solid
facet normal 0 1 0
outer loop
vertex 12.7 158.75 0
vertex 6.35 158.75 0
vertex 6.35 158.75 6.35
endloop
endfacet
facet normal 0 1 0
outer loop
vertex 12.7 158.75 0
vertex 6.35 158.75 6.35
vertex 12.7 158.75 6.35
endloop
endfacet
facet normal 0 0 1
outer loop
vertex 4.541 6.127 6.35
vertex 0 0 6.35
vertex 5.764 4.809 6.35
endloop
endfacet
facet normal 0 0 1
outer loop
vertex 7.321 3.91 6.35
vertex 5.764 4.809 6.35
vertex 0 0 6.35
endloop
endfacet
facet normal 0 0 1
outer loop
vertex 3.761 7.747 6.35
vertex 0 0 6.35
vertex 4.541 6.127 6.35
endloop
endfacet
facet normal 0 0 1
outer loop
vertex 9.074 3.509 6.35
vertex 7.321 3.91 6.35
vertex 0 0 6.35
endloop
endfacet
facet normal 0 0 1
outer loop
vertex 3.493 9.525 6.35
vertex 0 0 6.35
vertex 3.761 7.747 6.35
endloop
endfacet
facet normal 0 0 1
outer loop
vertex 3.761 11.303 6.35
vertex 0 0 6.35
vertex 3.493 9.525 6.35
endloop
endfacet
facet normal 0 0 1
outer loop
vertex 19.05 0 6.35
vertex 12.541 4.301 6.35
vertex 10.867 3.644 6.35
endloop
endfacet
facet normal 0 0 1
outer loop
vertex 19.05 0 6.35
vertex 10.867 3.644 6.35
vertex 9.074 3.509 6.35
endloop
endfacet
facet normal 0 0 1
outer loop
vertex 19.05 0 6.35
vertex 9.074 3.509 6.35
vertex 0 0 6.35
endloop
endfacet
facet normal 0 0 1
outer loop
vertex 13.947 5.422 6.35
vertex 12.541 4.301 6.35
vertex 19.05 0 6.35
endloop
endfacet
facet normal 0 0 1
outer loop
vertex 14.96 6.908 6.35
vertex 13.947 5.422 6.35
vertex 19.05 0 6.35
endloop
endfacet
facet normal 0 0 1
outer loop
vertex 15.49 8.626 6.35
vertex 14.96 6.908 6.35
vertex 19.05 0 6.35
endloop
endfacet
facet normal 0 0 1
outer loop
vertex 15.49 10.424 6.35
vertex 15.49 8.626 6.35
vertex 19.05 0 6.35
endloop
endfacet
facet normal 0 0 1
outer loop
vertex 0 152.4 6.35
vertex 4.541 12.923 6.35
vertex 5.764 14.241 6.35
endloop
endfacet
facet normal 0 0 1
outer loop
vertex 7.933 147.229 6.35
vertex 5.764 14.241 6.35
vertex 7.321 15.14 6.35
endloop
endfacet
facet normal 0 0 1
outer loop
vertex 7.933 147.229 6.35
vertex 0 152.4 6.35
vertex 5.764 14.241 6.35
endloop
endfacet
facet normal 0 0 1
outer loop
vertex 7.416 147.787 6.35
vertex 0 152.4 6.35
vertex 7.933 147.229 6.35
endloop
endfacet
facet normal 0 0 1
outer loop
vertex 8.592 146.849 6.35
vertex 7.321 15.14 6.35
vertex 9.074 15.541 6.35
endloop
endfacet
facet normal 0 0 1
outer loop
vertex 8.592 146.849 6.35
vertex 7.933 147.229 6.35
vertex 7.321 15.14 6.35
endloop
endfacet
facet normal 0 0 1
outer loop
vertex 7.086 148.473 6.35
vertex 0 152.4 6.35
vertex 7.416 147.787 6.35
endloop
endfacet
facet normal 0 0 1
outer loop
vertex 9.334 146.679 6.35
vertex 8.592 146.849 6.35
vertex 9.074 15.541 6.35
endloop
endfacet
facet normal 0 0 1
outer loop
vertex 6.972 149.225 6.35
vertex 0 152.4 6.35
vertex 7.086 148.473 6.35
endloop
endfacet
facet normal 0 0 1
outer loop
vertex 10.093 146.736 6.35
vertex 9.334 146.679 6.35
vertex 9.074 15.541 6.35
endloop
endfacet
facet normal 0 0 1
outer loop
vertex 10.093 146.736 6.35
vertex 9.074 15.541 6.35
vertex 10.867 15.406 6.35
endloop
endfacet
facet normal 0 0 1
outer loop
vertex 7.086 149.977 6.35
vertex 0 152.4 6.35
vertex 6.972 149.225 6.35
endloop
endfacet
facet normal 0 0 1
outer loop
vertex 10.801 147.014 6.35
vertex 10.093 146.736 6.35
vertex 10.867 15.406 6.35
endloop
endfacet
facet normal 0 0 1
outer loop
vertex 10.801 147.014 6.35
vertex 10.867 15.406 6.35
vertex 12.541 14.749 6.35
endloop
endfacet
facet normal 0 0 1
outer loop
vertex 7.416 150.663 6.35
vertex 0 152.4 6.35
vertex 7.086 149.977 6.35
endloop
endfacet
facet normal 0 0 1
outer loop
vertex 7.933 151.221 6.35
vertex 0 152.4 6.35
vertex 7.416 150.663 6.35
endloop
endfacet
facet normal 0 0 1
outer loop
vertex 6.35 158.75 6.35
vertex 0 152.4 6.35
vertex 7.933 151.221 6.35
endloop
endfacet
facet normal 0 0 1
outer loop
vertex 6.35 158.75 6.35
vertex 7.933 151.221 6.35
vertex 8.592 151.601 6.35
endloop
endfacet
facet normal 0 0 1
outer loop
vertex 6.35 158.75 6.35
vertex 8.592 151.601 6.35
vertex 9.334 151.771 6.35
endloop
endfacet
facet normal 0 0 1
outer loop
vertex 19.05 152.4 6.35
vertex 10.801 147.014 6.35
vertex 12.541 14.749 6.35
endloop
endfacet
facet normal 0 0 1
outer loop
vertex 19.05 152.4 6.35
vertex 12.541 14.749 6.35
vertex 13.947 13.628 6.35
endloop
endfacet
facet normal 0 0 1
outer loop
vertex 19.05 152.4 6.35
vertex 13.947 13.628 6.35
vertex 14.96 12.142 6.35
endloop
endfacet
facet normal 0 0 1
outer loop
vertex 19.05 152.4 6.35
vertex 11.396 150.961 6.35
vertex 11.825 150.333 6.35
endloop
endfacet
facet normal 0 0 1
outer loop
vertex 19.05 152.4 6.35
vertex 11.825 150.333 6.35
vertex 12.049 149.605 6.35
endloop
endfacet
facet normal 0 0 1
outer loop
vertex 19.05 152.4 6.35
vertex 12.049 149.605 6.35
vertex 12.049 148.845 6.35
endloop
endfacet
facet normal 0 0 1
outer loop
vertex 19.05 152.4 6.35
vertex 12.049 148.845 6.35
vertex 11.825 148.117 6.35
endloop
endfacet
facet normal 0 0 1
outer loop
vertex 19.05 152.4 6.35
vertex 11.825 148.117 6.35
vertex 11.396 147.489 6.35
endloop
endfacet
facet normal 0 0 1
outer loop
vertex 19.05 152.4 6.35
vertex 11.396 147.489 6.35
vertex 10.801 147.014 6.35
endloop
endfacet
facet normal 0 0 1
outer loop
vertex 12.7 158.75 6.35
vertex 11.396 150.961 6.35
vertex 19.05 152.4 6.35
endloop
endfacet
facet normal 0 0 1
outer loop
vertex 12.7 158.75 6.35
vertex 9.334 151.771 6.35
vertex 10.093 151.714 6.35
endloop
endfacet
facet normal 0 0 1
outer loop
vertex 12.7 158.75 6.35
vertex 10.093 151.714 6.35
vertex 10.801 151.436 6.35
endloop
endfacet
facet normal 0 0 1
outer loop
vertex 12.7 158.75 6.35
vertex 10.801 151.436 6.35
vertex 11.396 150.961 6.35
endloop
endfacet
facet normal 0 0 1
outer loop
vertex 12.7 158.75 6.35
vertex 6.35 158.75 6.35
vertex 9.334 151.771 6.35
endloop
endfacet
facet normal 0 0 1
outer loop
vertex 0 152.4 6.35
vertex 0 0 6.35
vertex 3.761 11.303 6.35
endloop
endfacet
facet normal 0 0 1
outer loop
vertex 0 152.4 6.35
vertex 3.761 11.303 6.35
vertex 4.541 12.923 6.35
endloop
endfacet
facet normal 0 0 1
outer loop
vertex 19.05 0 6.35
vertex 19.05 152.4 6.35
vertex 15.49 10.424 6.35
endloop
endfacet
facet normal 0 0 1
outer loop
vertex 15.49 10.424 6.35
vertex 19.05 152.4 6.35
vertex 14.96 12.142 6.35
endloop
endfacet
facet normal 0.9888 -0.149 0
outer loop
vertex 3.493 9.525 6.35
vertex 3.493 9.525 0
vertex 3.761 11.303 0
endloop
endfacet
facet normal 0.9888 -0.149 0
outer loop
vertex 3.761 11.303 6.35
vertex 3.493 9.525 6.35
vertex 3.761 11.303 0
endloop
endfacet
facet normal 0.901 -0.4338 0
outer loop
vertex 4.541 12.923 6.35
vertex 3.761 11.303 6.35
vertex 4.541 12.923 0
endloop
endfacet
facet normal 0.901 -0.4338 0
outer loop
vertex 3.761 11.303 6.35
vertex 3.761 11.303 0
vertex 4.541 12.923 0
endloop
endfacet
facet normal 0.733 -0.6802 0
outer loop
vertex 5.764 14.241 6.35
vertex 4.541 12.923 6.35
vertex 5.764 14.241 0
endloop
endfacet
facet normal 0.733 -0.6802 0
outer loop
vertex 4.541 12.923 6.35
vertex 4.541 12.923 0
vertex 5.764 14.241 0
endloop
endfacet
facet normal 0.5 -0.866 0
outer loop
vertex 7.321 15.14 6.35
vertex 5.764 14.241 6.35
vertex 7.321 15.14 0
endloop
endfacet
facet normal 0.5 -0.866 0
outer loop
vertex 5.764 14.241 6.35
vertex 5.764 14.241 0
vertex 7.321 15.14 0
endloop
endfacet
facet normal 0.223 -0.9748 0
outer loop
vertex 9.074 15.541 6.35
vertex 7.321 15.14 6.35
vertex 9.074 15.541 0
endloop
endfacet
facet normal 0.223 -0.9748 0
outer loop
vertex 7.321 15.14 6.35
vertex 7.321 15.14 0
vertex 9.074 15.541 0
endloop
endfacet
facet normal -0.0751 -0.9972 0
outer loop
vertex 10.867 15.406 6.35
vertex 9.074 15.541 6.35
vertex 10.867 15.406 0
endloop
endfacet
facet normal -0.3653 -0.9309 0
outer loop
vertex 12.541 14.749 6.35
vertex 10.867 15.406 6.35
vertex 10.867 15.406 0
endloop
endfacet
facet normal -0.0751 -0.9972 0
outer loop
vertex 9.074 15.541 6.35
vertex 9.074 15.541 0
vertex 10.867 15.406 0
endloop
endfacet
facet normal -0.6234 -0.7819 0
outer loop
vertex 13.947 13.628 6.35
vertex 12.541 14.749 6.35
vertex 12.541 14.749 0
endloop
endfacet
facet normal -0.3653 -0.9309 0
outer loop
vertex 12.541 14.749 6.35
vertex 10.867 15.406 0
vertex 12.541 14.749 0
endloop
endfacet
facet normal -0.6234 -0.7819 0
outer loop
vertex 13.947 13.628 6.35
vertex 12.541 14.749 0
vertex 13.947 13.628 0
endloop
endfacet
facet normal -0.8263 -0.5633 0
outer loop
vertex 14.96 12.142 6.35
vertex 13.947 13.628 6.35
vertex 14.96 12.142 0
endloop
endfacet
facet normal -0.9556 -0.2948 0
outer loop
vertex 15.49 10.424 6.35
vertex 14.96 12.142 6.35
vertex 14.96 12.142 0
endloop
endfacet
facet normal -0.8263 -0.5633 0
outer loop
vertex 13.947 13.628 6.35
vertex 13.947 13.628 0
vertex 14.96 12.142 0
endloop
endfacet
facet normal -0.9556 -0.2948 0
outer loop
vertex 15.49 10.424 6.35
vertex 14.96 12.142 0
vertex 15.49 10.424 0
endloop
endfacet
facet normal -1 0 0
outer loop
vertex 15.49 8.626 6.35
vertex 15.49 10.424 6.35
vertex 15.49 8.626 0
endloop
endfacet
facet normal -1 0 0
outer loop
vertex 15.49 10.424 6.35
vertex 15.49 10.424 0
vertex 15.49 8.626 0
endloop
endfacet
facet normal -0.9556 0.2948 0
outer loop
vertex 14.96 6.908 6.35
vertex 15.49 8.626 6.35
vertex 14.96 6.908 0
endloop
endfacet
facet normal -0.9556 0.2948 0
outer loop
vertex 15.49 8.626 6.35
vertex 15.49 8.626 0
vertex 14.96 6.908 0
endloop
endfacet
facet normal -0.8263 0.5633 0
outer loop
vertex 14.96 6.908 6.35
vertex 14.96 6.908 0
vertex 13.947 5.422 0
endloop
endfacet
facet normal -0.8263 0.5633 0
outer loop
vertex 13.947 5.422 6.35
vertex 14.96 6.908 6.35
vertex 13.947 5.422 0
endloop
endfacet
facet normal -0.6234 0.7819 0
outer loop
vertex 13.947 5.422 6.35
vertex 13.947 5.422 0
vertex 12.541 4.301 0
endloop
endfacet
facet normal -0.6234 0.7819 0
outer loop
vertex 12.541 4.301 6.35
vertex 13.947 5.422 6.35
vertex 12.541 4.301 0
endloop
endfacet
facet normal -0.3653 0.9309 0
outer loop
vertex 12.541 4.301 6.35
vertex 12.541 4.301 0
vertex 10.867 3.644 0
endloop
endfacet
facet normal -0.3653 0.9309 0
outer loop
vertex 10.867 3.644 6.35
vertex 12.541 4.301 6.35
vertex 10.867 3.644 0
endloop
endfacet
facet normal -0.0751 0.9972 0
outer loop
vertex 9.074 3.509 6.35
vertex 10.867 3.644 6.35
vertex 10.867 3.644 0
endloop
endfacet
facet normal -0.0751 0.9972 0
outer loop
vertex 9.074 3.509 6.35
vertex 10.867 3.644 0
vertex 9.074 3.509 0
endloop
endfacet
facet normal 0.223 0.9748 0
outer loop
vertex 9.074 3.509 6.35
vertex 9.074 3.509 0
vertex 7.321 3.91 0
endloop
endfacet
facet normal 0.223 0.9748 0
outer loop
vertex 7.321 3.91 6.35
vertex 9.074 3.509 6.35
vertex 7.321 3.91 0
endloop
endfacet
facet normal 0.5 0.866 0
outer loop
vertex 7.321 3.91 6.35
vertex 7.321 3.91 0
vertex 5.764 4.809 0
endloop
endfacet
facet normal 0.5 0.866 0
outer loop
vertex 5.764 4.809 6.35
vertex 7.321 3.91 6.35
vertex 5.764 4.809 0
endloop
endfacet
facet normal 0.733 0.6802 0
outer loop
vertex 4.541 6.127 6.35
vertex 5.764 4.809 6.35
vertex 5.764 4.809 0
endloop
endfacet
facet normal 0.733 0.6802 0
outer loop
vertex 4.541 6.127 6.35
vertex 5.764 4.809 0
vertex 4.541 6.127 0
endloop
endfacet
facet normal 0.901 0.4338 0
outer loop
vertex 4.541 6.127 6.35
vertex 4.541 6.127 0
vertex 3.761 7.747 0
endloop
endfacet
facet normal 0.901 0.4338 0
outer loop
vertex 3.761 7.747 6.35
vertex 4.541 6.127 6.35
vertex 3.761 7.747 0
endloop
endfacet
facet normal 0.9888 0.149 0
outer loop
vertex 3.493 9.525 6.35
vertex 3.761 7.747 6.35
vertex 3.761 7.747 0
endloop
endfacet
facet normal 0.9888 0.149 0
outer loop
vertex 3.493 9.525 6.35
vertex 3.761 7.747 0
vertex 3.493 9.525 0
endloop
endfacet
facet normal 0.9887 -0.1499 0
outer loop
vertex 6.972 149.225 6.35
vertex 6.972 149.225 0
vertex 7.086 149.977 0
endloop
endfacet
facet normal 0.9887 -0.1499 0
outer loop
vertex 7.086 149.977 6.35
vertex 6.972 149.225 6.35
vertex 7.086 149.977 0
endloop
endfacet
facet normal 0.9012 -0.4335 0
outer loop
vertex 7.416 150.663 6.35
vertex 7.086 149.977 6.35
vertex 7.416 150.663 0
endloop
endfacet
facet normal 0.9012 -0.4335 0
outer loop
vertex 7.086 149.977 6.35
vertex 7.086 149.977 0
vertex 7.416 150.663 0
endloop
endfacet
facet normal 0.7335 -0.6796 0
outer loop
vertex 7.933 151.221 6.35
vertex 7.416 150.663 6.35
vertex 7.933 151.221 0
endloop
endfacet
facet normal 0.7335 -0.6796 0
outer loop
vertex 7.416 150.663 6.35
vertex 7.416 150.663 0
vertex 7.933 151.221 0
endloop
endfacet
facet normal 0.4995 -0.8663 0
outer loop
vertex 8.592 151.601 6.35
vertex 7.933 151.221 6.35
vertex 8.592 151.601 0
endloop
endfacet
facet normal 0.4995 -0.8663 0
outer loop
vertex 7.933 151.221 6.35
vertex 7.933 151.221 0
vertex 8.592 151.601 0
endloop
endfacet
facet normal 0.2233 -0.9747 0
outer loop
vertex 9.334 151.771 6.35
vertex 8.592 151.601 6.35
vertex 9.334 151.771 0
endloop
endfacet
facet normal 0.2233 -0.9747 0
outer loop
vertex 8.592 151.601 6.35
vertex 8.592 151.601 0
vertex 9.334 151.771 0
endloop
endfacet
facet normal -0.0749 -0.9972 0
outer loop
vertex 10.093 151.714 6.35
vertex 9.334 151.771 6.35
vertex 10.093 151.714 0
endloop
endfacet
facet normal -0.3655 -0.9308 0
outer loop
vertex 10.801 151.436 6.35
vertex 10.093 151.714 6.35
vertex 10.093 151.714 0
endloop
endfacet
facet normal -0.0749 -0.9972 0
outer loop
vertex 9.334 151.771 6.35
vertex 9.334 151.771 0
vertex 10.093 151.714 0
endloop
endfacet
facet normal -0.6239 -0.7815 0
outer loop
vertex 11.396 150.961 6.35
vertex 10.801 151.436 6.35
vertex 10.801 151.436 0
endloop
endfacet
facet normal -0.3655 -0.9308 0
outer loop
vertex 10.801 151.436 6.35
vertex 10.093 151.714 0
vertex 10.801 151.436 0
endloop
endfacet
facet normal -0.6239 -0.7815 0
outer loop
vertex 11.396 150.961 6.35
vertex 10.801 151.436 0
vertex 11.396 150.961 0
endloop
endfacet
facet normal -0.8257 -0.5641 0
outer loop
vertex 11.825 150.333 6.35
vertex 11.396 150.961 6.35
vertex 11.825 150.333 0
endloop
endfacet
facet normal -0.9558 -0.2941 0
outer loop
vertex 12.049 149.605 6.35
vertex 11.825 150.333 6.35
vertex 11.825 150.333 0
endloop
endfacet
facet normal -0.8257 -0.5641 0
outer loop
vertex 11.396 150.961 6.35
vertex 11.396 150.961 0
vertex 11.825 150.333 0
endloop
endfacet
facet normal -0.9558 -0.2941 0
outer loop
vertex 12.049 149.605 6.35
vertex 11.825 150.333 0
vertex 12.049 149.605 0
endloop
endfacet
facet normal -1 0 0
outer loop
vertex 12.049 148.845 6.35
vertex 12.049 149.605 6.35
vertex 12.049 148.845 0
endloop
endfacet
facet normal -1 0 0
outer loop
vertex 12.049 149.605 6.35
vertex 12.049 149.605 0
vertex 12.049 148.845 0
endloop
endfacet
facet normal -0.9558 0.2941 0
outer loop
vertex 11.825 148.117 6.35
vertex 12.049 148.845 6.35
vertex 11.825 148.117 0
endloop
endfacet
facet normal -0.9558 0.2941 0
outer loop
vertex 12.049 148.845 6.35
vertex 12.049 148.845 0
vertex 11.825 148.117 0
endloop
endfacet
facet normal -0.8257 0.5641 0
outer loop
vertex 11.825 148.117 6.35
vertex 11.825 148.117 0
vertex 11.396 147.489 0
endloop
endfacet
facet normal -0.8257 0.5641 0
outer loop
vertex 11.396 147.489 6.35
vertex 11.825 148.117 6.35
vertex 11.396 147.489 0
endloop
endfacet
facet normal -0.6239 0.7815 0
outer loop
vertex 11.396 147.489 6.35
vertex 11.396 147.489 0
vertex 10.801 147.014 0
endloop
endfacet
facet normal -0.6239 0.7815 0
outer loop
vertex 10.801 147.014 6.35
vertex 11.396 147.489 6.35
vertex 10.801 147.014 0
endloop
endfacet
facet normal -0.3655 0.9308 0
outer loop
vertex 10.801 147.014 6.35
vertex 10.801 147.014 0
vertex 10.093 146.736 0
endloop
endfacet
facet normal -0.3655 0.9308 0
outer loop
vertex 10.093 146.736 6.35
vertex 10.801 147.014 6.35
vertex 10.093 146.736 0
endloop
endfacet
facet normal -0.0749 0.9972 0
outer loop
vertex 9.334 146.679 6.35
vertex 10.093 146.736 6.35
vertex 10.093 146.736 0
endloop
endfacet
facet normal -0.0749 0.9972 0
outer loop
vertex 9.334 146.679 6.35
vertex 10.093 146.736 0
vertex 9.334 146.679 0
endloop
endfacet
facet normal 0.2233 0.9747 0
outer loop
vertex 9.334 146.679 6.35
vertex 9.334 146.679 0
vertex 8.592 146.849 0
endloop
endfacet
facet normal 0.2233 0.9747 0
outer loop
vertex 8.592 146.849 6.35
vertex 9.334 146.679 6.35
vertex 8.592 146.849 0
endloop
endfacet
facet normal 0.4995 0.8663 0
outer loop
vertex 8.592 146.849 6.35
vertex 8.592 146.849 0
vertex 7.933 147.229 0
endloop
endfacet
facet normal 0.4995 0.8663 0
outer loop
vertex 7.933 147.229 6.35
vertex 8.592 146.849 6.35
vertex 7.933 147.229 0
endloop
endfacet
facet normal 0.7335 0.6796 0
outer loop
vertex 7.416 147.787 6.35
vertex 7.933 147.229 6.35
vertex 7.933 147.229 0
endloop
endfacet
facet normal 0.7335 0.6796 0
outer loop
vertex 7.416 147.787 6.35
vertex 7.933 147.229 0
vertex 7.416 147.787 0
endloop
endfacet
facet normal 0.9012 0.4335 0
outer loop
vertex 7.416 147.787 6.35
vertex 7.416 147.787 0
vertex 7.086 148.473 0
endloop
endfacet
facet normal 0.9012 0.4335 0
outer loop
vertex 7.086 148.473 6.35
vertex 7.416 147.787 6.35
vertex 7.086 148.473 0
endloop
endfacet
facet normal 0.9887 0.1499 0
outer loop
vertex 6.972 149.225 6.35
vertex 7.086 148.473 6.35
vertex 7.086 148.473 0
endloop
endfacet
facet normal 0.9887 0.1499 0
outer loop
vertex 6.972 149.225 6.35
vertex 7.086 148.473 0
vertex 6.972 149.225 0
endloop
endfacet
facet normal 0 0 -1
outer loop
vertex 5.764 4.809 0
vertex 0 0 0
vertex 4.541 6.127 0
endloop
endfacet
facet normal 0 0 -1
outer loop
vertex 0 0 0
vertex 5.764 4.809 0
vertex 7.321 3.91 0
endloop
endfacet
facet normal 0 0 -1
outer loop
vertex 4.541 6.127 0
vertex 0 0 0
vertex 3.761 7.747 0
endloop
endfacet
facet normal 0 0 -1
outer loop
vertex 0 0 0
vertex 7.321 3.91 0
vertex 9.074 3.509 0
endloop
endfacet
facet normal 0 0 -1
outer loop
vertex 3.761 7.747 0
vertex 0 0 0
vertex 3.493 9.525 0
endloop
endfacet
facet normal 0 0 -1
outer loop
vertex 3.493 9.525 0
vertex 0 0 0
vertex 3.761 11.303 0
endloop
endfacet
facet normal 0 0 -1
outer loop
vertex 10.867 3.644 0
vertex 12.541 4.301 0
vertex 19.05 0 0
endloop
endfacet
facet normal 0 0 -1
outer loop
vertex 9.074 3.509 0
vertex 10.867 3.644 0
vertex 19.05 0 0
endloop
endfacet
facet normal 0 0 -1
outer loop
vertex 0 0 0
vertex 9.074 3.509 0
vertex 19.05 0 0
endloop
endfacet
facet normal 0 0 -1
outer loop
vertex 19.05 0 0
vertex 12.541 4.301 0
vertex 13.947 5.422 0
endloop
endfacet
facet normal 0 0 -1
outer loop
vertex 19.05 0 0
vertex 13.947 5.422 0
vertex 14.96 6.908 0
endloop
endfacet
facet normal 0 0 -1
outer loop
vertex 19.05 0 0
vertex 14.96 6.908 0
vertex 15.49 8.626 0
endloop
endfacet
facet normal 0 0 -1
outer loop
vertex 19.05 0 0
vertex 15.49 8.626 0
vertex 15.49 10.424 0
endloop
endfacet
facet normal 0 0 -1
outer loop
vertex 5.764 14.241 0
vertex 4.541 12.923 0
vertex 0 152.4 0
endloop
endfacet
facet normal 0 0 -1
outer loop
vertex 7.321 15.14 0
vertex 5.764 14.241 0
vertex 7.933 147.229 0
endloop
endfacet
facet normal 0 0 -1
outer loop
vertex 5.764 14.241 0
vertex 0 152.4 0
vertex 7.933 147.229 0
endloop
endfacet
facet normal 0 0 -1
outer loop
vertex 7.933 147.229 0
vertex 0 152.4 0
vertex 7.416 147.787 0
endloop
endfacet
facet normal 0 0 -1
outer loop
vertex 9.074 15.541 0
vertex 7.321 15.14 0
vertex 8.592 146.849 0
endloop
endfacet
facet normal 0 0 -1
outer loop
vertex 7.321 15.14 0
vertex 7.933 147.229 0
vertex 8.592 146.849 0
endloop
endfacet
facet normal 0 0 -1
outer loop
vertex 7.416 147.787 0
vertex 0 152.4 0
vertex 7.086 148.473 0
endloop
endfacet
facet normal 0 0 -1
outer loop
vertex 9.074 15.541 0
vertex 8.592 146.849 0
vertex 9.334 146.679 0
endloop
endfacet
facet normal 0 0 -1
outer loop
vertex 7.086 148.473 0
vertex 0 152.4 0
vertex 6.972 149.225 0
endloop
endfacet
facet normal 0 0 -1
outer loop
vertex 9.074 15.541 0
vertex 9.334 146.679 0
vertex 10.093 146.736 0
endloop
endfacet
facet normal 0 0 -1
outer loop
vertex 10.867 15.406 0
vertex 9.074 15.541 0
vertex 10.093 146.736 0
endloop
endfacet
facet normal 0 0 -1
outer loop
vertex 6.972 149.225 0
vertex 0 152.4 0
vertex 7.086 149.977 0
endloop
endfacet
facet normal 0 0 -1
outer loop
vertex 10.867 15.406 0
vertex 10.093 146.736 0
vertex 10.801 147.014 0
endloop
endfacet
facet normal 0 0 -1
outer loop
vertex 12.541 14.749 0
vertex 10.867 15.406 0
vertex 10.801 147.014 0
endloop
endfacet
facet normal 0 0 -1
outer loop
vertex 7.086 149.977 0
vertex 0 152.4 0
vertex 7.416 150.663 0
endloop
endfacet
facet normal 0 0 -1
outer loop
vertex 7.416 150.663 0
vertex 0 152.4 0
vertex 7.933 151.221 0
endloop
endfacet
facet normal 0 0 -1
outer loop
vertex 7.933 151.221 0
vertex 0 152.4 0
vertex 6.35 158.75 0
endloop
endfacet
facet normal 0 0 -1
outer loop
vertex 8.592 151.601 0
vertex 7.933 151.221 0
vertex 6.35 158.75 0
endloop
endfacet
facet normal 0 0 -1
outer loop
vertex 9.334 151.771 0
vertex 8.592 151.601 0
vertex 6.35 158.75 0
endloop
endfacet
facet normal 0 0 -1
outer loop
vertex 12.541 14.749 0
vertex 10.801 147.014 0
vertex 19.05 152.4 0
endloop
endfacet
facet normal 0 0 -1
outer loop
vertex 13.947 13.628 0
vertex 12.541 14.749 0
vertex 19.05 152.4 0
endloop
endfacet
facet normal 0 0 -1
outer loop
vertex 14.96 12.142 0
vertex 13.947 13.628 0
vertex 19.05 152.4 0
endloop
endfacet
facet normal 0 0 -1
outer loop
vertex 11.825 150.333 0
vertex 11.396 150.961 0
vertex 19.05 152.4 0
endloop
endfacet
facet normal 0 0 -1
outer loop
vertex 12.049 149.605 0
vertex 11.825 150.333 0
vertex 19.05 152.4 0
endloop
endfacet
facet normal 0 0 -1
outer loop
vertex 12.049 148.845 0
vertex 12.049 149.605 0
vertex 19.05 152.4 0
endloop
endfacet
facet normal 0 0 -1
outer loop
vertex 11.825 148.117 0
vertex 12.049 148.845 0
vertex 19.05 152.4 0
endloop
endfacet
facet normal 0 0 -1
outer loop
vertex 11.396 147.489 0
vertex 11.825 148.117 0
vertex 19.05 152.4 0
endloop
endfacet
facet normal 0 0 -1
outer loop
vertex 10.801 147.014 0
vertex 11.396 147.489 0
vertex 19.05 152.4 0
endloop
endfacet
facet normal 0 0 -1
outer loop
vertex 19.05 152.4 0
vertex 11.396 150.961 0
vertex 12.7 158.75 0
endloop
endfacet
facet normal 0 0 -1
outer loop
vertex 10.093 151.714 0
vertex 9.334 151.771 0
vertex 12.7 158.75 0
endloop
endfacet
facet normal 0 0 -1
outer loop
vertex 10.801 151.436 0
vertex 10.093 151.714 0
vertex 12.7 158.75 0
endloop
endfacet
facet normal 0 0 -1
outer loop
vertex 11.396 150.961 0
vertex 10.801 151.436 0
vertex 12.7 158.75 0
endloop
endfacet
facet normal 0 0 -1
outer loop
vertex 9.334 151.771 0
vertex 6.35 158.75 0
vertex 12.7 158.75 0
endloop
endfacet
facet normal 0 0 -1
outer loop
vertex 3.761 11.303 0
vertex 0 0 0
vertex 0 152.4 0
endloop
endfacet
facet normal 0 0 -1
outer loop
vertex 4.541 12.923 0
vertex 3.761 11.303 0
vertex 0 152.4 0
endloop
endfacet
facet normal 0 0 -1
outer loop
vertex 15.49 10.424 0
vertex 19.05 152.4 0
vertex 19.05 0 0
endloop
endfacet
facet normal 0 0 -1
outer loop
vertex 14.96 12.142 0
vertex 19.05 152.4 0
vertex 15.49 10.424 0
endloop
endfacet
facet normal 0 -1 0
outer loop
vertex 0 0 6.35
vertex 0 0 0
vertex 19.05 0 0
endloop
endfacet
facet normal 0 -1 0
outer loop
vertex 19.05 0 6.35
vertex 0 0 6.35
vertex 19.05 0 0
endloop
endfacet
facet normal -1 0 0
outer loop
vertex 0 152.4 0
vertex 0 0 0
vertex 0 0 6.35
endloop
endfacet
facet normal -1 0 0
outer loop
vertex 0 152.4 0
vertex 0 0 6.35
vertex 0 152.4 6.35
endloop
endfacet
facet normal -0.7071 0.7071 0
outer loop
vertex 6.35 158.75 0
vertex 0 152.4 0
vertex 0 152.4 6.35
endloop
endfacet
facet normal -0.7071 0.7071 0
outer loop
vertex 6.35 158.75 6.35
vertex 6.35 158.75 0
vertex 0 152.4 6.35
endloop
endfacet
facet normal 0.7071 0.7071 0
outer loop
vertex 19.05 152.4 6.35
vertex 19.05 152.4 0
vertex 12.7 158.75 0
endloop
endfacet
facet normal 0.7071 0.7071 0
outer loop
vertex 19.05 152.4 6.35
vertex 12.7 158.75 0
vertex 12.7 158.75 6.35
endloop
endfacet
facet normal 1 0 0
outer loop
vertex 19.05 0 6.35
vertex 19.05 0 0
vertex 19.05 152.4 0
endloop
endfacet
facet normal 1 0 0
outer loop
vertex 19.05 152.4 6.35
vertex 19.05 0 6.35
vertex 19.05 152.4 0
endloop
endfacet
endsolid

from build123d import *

# Parameters (mm, degrees)
SKETCH1_W                    = 19.05
SKETCH1_H                    = 158.75
BOSS_EXTRUDE1_DEPTH          = 6.35
F_1_4_20_TAPPED_HOLE1_D      = 5.1054
F_1_4_0_475_DIAMETER_HOLE1_D = 12.065
CHAMFER1_SIZE                = 6.35


with BuildPart() as part:
    # Sketch1 → Boss-Extrude1 (new body)
    with BuildSketch(Plane.XY):
        with Locations((9.525, 79.375)):
            Rectangle(SKETCH1_W, SKETCH1_H)
    extrude(amount=BOSS_EXTRUDE1_DEPTH)

    # 1/4-20 Tapped Hole1 (through all)
    with Locations(Plane.XY.offset(6.35)):
        with Locations((9.525, 149.225)):
            Hole(F_1_4_20_TAPPED_HOLE1_D / 2)

    # 1/4 (0.475) Diameter Hole1 (through all)
    with Locations(Plane.XY.offset(6.35)):
        with Locations((9.525, 9.525)):
            Hole(F_1_4_0_475_DIAMETER_HOLE1_D / 2)

    # Chamfer1
    chamfer1_edges = [part.edges().sort_by_distance(p)[0] for p in [
        (0, 158.75, 3.175),
        (19.05, 158.75, 3.175),
    ]]
    chamfer(chamfer1_edges, length=CHAMFER1_SIZE)


solid = part.part
